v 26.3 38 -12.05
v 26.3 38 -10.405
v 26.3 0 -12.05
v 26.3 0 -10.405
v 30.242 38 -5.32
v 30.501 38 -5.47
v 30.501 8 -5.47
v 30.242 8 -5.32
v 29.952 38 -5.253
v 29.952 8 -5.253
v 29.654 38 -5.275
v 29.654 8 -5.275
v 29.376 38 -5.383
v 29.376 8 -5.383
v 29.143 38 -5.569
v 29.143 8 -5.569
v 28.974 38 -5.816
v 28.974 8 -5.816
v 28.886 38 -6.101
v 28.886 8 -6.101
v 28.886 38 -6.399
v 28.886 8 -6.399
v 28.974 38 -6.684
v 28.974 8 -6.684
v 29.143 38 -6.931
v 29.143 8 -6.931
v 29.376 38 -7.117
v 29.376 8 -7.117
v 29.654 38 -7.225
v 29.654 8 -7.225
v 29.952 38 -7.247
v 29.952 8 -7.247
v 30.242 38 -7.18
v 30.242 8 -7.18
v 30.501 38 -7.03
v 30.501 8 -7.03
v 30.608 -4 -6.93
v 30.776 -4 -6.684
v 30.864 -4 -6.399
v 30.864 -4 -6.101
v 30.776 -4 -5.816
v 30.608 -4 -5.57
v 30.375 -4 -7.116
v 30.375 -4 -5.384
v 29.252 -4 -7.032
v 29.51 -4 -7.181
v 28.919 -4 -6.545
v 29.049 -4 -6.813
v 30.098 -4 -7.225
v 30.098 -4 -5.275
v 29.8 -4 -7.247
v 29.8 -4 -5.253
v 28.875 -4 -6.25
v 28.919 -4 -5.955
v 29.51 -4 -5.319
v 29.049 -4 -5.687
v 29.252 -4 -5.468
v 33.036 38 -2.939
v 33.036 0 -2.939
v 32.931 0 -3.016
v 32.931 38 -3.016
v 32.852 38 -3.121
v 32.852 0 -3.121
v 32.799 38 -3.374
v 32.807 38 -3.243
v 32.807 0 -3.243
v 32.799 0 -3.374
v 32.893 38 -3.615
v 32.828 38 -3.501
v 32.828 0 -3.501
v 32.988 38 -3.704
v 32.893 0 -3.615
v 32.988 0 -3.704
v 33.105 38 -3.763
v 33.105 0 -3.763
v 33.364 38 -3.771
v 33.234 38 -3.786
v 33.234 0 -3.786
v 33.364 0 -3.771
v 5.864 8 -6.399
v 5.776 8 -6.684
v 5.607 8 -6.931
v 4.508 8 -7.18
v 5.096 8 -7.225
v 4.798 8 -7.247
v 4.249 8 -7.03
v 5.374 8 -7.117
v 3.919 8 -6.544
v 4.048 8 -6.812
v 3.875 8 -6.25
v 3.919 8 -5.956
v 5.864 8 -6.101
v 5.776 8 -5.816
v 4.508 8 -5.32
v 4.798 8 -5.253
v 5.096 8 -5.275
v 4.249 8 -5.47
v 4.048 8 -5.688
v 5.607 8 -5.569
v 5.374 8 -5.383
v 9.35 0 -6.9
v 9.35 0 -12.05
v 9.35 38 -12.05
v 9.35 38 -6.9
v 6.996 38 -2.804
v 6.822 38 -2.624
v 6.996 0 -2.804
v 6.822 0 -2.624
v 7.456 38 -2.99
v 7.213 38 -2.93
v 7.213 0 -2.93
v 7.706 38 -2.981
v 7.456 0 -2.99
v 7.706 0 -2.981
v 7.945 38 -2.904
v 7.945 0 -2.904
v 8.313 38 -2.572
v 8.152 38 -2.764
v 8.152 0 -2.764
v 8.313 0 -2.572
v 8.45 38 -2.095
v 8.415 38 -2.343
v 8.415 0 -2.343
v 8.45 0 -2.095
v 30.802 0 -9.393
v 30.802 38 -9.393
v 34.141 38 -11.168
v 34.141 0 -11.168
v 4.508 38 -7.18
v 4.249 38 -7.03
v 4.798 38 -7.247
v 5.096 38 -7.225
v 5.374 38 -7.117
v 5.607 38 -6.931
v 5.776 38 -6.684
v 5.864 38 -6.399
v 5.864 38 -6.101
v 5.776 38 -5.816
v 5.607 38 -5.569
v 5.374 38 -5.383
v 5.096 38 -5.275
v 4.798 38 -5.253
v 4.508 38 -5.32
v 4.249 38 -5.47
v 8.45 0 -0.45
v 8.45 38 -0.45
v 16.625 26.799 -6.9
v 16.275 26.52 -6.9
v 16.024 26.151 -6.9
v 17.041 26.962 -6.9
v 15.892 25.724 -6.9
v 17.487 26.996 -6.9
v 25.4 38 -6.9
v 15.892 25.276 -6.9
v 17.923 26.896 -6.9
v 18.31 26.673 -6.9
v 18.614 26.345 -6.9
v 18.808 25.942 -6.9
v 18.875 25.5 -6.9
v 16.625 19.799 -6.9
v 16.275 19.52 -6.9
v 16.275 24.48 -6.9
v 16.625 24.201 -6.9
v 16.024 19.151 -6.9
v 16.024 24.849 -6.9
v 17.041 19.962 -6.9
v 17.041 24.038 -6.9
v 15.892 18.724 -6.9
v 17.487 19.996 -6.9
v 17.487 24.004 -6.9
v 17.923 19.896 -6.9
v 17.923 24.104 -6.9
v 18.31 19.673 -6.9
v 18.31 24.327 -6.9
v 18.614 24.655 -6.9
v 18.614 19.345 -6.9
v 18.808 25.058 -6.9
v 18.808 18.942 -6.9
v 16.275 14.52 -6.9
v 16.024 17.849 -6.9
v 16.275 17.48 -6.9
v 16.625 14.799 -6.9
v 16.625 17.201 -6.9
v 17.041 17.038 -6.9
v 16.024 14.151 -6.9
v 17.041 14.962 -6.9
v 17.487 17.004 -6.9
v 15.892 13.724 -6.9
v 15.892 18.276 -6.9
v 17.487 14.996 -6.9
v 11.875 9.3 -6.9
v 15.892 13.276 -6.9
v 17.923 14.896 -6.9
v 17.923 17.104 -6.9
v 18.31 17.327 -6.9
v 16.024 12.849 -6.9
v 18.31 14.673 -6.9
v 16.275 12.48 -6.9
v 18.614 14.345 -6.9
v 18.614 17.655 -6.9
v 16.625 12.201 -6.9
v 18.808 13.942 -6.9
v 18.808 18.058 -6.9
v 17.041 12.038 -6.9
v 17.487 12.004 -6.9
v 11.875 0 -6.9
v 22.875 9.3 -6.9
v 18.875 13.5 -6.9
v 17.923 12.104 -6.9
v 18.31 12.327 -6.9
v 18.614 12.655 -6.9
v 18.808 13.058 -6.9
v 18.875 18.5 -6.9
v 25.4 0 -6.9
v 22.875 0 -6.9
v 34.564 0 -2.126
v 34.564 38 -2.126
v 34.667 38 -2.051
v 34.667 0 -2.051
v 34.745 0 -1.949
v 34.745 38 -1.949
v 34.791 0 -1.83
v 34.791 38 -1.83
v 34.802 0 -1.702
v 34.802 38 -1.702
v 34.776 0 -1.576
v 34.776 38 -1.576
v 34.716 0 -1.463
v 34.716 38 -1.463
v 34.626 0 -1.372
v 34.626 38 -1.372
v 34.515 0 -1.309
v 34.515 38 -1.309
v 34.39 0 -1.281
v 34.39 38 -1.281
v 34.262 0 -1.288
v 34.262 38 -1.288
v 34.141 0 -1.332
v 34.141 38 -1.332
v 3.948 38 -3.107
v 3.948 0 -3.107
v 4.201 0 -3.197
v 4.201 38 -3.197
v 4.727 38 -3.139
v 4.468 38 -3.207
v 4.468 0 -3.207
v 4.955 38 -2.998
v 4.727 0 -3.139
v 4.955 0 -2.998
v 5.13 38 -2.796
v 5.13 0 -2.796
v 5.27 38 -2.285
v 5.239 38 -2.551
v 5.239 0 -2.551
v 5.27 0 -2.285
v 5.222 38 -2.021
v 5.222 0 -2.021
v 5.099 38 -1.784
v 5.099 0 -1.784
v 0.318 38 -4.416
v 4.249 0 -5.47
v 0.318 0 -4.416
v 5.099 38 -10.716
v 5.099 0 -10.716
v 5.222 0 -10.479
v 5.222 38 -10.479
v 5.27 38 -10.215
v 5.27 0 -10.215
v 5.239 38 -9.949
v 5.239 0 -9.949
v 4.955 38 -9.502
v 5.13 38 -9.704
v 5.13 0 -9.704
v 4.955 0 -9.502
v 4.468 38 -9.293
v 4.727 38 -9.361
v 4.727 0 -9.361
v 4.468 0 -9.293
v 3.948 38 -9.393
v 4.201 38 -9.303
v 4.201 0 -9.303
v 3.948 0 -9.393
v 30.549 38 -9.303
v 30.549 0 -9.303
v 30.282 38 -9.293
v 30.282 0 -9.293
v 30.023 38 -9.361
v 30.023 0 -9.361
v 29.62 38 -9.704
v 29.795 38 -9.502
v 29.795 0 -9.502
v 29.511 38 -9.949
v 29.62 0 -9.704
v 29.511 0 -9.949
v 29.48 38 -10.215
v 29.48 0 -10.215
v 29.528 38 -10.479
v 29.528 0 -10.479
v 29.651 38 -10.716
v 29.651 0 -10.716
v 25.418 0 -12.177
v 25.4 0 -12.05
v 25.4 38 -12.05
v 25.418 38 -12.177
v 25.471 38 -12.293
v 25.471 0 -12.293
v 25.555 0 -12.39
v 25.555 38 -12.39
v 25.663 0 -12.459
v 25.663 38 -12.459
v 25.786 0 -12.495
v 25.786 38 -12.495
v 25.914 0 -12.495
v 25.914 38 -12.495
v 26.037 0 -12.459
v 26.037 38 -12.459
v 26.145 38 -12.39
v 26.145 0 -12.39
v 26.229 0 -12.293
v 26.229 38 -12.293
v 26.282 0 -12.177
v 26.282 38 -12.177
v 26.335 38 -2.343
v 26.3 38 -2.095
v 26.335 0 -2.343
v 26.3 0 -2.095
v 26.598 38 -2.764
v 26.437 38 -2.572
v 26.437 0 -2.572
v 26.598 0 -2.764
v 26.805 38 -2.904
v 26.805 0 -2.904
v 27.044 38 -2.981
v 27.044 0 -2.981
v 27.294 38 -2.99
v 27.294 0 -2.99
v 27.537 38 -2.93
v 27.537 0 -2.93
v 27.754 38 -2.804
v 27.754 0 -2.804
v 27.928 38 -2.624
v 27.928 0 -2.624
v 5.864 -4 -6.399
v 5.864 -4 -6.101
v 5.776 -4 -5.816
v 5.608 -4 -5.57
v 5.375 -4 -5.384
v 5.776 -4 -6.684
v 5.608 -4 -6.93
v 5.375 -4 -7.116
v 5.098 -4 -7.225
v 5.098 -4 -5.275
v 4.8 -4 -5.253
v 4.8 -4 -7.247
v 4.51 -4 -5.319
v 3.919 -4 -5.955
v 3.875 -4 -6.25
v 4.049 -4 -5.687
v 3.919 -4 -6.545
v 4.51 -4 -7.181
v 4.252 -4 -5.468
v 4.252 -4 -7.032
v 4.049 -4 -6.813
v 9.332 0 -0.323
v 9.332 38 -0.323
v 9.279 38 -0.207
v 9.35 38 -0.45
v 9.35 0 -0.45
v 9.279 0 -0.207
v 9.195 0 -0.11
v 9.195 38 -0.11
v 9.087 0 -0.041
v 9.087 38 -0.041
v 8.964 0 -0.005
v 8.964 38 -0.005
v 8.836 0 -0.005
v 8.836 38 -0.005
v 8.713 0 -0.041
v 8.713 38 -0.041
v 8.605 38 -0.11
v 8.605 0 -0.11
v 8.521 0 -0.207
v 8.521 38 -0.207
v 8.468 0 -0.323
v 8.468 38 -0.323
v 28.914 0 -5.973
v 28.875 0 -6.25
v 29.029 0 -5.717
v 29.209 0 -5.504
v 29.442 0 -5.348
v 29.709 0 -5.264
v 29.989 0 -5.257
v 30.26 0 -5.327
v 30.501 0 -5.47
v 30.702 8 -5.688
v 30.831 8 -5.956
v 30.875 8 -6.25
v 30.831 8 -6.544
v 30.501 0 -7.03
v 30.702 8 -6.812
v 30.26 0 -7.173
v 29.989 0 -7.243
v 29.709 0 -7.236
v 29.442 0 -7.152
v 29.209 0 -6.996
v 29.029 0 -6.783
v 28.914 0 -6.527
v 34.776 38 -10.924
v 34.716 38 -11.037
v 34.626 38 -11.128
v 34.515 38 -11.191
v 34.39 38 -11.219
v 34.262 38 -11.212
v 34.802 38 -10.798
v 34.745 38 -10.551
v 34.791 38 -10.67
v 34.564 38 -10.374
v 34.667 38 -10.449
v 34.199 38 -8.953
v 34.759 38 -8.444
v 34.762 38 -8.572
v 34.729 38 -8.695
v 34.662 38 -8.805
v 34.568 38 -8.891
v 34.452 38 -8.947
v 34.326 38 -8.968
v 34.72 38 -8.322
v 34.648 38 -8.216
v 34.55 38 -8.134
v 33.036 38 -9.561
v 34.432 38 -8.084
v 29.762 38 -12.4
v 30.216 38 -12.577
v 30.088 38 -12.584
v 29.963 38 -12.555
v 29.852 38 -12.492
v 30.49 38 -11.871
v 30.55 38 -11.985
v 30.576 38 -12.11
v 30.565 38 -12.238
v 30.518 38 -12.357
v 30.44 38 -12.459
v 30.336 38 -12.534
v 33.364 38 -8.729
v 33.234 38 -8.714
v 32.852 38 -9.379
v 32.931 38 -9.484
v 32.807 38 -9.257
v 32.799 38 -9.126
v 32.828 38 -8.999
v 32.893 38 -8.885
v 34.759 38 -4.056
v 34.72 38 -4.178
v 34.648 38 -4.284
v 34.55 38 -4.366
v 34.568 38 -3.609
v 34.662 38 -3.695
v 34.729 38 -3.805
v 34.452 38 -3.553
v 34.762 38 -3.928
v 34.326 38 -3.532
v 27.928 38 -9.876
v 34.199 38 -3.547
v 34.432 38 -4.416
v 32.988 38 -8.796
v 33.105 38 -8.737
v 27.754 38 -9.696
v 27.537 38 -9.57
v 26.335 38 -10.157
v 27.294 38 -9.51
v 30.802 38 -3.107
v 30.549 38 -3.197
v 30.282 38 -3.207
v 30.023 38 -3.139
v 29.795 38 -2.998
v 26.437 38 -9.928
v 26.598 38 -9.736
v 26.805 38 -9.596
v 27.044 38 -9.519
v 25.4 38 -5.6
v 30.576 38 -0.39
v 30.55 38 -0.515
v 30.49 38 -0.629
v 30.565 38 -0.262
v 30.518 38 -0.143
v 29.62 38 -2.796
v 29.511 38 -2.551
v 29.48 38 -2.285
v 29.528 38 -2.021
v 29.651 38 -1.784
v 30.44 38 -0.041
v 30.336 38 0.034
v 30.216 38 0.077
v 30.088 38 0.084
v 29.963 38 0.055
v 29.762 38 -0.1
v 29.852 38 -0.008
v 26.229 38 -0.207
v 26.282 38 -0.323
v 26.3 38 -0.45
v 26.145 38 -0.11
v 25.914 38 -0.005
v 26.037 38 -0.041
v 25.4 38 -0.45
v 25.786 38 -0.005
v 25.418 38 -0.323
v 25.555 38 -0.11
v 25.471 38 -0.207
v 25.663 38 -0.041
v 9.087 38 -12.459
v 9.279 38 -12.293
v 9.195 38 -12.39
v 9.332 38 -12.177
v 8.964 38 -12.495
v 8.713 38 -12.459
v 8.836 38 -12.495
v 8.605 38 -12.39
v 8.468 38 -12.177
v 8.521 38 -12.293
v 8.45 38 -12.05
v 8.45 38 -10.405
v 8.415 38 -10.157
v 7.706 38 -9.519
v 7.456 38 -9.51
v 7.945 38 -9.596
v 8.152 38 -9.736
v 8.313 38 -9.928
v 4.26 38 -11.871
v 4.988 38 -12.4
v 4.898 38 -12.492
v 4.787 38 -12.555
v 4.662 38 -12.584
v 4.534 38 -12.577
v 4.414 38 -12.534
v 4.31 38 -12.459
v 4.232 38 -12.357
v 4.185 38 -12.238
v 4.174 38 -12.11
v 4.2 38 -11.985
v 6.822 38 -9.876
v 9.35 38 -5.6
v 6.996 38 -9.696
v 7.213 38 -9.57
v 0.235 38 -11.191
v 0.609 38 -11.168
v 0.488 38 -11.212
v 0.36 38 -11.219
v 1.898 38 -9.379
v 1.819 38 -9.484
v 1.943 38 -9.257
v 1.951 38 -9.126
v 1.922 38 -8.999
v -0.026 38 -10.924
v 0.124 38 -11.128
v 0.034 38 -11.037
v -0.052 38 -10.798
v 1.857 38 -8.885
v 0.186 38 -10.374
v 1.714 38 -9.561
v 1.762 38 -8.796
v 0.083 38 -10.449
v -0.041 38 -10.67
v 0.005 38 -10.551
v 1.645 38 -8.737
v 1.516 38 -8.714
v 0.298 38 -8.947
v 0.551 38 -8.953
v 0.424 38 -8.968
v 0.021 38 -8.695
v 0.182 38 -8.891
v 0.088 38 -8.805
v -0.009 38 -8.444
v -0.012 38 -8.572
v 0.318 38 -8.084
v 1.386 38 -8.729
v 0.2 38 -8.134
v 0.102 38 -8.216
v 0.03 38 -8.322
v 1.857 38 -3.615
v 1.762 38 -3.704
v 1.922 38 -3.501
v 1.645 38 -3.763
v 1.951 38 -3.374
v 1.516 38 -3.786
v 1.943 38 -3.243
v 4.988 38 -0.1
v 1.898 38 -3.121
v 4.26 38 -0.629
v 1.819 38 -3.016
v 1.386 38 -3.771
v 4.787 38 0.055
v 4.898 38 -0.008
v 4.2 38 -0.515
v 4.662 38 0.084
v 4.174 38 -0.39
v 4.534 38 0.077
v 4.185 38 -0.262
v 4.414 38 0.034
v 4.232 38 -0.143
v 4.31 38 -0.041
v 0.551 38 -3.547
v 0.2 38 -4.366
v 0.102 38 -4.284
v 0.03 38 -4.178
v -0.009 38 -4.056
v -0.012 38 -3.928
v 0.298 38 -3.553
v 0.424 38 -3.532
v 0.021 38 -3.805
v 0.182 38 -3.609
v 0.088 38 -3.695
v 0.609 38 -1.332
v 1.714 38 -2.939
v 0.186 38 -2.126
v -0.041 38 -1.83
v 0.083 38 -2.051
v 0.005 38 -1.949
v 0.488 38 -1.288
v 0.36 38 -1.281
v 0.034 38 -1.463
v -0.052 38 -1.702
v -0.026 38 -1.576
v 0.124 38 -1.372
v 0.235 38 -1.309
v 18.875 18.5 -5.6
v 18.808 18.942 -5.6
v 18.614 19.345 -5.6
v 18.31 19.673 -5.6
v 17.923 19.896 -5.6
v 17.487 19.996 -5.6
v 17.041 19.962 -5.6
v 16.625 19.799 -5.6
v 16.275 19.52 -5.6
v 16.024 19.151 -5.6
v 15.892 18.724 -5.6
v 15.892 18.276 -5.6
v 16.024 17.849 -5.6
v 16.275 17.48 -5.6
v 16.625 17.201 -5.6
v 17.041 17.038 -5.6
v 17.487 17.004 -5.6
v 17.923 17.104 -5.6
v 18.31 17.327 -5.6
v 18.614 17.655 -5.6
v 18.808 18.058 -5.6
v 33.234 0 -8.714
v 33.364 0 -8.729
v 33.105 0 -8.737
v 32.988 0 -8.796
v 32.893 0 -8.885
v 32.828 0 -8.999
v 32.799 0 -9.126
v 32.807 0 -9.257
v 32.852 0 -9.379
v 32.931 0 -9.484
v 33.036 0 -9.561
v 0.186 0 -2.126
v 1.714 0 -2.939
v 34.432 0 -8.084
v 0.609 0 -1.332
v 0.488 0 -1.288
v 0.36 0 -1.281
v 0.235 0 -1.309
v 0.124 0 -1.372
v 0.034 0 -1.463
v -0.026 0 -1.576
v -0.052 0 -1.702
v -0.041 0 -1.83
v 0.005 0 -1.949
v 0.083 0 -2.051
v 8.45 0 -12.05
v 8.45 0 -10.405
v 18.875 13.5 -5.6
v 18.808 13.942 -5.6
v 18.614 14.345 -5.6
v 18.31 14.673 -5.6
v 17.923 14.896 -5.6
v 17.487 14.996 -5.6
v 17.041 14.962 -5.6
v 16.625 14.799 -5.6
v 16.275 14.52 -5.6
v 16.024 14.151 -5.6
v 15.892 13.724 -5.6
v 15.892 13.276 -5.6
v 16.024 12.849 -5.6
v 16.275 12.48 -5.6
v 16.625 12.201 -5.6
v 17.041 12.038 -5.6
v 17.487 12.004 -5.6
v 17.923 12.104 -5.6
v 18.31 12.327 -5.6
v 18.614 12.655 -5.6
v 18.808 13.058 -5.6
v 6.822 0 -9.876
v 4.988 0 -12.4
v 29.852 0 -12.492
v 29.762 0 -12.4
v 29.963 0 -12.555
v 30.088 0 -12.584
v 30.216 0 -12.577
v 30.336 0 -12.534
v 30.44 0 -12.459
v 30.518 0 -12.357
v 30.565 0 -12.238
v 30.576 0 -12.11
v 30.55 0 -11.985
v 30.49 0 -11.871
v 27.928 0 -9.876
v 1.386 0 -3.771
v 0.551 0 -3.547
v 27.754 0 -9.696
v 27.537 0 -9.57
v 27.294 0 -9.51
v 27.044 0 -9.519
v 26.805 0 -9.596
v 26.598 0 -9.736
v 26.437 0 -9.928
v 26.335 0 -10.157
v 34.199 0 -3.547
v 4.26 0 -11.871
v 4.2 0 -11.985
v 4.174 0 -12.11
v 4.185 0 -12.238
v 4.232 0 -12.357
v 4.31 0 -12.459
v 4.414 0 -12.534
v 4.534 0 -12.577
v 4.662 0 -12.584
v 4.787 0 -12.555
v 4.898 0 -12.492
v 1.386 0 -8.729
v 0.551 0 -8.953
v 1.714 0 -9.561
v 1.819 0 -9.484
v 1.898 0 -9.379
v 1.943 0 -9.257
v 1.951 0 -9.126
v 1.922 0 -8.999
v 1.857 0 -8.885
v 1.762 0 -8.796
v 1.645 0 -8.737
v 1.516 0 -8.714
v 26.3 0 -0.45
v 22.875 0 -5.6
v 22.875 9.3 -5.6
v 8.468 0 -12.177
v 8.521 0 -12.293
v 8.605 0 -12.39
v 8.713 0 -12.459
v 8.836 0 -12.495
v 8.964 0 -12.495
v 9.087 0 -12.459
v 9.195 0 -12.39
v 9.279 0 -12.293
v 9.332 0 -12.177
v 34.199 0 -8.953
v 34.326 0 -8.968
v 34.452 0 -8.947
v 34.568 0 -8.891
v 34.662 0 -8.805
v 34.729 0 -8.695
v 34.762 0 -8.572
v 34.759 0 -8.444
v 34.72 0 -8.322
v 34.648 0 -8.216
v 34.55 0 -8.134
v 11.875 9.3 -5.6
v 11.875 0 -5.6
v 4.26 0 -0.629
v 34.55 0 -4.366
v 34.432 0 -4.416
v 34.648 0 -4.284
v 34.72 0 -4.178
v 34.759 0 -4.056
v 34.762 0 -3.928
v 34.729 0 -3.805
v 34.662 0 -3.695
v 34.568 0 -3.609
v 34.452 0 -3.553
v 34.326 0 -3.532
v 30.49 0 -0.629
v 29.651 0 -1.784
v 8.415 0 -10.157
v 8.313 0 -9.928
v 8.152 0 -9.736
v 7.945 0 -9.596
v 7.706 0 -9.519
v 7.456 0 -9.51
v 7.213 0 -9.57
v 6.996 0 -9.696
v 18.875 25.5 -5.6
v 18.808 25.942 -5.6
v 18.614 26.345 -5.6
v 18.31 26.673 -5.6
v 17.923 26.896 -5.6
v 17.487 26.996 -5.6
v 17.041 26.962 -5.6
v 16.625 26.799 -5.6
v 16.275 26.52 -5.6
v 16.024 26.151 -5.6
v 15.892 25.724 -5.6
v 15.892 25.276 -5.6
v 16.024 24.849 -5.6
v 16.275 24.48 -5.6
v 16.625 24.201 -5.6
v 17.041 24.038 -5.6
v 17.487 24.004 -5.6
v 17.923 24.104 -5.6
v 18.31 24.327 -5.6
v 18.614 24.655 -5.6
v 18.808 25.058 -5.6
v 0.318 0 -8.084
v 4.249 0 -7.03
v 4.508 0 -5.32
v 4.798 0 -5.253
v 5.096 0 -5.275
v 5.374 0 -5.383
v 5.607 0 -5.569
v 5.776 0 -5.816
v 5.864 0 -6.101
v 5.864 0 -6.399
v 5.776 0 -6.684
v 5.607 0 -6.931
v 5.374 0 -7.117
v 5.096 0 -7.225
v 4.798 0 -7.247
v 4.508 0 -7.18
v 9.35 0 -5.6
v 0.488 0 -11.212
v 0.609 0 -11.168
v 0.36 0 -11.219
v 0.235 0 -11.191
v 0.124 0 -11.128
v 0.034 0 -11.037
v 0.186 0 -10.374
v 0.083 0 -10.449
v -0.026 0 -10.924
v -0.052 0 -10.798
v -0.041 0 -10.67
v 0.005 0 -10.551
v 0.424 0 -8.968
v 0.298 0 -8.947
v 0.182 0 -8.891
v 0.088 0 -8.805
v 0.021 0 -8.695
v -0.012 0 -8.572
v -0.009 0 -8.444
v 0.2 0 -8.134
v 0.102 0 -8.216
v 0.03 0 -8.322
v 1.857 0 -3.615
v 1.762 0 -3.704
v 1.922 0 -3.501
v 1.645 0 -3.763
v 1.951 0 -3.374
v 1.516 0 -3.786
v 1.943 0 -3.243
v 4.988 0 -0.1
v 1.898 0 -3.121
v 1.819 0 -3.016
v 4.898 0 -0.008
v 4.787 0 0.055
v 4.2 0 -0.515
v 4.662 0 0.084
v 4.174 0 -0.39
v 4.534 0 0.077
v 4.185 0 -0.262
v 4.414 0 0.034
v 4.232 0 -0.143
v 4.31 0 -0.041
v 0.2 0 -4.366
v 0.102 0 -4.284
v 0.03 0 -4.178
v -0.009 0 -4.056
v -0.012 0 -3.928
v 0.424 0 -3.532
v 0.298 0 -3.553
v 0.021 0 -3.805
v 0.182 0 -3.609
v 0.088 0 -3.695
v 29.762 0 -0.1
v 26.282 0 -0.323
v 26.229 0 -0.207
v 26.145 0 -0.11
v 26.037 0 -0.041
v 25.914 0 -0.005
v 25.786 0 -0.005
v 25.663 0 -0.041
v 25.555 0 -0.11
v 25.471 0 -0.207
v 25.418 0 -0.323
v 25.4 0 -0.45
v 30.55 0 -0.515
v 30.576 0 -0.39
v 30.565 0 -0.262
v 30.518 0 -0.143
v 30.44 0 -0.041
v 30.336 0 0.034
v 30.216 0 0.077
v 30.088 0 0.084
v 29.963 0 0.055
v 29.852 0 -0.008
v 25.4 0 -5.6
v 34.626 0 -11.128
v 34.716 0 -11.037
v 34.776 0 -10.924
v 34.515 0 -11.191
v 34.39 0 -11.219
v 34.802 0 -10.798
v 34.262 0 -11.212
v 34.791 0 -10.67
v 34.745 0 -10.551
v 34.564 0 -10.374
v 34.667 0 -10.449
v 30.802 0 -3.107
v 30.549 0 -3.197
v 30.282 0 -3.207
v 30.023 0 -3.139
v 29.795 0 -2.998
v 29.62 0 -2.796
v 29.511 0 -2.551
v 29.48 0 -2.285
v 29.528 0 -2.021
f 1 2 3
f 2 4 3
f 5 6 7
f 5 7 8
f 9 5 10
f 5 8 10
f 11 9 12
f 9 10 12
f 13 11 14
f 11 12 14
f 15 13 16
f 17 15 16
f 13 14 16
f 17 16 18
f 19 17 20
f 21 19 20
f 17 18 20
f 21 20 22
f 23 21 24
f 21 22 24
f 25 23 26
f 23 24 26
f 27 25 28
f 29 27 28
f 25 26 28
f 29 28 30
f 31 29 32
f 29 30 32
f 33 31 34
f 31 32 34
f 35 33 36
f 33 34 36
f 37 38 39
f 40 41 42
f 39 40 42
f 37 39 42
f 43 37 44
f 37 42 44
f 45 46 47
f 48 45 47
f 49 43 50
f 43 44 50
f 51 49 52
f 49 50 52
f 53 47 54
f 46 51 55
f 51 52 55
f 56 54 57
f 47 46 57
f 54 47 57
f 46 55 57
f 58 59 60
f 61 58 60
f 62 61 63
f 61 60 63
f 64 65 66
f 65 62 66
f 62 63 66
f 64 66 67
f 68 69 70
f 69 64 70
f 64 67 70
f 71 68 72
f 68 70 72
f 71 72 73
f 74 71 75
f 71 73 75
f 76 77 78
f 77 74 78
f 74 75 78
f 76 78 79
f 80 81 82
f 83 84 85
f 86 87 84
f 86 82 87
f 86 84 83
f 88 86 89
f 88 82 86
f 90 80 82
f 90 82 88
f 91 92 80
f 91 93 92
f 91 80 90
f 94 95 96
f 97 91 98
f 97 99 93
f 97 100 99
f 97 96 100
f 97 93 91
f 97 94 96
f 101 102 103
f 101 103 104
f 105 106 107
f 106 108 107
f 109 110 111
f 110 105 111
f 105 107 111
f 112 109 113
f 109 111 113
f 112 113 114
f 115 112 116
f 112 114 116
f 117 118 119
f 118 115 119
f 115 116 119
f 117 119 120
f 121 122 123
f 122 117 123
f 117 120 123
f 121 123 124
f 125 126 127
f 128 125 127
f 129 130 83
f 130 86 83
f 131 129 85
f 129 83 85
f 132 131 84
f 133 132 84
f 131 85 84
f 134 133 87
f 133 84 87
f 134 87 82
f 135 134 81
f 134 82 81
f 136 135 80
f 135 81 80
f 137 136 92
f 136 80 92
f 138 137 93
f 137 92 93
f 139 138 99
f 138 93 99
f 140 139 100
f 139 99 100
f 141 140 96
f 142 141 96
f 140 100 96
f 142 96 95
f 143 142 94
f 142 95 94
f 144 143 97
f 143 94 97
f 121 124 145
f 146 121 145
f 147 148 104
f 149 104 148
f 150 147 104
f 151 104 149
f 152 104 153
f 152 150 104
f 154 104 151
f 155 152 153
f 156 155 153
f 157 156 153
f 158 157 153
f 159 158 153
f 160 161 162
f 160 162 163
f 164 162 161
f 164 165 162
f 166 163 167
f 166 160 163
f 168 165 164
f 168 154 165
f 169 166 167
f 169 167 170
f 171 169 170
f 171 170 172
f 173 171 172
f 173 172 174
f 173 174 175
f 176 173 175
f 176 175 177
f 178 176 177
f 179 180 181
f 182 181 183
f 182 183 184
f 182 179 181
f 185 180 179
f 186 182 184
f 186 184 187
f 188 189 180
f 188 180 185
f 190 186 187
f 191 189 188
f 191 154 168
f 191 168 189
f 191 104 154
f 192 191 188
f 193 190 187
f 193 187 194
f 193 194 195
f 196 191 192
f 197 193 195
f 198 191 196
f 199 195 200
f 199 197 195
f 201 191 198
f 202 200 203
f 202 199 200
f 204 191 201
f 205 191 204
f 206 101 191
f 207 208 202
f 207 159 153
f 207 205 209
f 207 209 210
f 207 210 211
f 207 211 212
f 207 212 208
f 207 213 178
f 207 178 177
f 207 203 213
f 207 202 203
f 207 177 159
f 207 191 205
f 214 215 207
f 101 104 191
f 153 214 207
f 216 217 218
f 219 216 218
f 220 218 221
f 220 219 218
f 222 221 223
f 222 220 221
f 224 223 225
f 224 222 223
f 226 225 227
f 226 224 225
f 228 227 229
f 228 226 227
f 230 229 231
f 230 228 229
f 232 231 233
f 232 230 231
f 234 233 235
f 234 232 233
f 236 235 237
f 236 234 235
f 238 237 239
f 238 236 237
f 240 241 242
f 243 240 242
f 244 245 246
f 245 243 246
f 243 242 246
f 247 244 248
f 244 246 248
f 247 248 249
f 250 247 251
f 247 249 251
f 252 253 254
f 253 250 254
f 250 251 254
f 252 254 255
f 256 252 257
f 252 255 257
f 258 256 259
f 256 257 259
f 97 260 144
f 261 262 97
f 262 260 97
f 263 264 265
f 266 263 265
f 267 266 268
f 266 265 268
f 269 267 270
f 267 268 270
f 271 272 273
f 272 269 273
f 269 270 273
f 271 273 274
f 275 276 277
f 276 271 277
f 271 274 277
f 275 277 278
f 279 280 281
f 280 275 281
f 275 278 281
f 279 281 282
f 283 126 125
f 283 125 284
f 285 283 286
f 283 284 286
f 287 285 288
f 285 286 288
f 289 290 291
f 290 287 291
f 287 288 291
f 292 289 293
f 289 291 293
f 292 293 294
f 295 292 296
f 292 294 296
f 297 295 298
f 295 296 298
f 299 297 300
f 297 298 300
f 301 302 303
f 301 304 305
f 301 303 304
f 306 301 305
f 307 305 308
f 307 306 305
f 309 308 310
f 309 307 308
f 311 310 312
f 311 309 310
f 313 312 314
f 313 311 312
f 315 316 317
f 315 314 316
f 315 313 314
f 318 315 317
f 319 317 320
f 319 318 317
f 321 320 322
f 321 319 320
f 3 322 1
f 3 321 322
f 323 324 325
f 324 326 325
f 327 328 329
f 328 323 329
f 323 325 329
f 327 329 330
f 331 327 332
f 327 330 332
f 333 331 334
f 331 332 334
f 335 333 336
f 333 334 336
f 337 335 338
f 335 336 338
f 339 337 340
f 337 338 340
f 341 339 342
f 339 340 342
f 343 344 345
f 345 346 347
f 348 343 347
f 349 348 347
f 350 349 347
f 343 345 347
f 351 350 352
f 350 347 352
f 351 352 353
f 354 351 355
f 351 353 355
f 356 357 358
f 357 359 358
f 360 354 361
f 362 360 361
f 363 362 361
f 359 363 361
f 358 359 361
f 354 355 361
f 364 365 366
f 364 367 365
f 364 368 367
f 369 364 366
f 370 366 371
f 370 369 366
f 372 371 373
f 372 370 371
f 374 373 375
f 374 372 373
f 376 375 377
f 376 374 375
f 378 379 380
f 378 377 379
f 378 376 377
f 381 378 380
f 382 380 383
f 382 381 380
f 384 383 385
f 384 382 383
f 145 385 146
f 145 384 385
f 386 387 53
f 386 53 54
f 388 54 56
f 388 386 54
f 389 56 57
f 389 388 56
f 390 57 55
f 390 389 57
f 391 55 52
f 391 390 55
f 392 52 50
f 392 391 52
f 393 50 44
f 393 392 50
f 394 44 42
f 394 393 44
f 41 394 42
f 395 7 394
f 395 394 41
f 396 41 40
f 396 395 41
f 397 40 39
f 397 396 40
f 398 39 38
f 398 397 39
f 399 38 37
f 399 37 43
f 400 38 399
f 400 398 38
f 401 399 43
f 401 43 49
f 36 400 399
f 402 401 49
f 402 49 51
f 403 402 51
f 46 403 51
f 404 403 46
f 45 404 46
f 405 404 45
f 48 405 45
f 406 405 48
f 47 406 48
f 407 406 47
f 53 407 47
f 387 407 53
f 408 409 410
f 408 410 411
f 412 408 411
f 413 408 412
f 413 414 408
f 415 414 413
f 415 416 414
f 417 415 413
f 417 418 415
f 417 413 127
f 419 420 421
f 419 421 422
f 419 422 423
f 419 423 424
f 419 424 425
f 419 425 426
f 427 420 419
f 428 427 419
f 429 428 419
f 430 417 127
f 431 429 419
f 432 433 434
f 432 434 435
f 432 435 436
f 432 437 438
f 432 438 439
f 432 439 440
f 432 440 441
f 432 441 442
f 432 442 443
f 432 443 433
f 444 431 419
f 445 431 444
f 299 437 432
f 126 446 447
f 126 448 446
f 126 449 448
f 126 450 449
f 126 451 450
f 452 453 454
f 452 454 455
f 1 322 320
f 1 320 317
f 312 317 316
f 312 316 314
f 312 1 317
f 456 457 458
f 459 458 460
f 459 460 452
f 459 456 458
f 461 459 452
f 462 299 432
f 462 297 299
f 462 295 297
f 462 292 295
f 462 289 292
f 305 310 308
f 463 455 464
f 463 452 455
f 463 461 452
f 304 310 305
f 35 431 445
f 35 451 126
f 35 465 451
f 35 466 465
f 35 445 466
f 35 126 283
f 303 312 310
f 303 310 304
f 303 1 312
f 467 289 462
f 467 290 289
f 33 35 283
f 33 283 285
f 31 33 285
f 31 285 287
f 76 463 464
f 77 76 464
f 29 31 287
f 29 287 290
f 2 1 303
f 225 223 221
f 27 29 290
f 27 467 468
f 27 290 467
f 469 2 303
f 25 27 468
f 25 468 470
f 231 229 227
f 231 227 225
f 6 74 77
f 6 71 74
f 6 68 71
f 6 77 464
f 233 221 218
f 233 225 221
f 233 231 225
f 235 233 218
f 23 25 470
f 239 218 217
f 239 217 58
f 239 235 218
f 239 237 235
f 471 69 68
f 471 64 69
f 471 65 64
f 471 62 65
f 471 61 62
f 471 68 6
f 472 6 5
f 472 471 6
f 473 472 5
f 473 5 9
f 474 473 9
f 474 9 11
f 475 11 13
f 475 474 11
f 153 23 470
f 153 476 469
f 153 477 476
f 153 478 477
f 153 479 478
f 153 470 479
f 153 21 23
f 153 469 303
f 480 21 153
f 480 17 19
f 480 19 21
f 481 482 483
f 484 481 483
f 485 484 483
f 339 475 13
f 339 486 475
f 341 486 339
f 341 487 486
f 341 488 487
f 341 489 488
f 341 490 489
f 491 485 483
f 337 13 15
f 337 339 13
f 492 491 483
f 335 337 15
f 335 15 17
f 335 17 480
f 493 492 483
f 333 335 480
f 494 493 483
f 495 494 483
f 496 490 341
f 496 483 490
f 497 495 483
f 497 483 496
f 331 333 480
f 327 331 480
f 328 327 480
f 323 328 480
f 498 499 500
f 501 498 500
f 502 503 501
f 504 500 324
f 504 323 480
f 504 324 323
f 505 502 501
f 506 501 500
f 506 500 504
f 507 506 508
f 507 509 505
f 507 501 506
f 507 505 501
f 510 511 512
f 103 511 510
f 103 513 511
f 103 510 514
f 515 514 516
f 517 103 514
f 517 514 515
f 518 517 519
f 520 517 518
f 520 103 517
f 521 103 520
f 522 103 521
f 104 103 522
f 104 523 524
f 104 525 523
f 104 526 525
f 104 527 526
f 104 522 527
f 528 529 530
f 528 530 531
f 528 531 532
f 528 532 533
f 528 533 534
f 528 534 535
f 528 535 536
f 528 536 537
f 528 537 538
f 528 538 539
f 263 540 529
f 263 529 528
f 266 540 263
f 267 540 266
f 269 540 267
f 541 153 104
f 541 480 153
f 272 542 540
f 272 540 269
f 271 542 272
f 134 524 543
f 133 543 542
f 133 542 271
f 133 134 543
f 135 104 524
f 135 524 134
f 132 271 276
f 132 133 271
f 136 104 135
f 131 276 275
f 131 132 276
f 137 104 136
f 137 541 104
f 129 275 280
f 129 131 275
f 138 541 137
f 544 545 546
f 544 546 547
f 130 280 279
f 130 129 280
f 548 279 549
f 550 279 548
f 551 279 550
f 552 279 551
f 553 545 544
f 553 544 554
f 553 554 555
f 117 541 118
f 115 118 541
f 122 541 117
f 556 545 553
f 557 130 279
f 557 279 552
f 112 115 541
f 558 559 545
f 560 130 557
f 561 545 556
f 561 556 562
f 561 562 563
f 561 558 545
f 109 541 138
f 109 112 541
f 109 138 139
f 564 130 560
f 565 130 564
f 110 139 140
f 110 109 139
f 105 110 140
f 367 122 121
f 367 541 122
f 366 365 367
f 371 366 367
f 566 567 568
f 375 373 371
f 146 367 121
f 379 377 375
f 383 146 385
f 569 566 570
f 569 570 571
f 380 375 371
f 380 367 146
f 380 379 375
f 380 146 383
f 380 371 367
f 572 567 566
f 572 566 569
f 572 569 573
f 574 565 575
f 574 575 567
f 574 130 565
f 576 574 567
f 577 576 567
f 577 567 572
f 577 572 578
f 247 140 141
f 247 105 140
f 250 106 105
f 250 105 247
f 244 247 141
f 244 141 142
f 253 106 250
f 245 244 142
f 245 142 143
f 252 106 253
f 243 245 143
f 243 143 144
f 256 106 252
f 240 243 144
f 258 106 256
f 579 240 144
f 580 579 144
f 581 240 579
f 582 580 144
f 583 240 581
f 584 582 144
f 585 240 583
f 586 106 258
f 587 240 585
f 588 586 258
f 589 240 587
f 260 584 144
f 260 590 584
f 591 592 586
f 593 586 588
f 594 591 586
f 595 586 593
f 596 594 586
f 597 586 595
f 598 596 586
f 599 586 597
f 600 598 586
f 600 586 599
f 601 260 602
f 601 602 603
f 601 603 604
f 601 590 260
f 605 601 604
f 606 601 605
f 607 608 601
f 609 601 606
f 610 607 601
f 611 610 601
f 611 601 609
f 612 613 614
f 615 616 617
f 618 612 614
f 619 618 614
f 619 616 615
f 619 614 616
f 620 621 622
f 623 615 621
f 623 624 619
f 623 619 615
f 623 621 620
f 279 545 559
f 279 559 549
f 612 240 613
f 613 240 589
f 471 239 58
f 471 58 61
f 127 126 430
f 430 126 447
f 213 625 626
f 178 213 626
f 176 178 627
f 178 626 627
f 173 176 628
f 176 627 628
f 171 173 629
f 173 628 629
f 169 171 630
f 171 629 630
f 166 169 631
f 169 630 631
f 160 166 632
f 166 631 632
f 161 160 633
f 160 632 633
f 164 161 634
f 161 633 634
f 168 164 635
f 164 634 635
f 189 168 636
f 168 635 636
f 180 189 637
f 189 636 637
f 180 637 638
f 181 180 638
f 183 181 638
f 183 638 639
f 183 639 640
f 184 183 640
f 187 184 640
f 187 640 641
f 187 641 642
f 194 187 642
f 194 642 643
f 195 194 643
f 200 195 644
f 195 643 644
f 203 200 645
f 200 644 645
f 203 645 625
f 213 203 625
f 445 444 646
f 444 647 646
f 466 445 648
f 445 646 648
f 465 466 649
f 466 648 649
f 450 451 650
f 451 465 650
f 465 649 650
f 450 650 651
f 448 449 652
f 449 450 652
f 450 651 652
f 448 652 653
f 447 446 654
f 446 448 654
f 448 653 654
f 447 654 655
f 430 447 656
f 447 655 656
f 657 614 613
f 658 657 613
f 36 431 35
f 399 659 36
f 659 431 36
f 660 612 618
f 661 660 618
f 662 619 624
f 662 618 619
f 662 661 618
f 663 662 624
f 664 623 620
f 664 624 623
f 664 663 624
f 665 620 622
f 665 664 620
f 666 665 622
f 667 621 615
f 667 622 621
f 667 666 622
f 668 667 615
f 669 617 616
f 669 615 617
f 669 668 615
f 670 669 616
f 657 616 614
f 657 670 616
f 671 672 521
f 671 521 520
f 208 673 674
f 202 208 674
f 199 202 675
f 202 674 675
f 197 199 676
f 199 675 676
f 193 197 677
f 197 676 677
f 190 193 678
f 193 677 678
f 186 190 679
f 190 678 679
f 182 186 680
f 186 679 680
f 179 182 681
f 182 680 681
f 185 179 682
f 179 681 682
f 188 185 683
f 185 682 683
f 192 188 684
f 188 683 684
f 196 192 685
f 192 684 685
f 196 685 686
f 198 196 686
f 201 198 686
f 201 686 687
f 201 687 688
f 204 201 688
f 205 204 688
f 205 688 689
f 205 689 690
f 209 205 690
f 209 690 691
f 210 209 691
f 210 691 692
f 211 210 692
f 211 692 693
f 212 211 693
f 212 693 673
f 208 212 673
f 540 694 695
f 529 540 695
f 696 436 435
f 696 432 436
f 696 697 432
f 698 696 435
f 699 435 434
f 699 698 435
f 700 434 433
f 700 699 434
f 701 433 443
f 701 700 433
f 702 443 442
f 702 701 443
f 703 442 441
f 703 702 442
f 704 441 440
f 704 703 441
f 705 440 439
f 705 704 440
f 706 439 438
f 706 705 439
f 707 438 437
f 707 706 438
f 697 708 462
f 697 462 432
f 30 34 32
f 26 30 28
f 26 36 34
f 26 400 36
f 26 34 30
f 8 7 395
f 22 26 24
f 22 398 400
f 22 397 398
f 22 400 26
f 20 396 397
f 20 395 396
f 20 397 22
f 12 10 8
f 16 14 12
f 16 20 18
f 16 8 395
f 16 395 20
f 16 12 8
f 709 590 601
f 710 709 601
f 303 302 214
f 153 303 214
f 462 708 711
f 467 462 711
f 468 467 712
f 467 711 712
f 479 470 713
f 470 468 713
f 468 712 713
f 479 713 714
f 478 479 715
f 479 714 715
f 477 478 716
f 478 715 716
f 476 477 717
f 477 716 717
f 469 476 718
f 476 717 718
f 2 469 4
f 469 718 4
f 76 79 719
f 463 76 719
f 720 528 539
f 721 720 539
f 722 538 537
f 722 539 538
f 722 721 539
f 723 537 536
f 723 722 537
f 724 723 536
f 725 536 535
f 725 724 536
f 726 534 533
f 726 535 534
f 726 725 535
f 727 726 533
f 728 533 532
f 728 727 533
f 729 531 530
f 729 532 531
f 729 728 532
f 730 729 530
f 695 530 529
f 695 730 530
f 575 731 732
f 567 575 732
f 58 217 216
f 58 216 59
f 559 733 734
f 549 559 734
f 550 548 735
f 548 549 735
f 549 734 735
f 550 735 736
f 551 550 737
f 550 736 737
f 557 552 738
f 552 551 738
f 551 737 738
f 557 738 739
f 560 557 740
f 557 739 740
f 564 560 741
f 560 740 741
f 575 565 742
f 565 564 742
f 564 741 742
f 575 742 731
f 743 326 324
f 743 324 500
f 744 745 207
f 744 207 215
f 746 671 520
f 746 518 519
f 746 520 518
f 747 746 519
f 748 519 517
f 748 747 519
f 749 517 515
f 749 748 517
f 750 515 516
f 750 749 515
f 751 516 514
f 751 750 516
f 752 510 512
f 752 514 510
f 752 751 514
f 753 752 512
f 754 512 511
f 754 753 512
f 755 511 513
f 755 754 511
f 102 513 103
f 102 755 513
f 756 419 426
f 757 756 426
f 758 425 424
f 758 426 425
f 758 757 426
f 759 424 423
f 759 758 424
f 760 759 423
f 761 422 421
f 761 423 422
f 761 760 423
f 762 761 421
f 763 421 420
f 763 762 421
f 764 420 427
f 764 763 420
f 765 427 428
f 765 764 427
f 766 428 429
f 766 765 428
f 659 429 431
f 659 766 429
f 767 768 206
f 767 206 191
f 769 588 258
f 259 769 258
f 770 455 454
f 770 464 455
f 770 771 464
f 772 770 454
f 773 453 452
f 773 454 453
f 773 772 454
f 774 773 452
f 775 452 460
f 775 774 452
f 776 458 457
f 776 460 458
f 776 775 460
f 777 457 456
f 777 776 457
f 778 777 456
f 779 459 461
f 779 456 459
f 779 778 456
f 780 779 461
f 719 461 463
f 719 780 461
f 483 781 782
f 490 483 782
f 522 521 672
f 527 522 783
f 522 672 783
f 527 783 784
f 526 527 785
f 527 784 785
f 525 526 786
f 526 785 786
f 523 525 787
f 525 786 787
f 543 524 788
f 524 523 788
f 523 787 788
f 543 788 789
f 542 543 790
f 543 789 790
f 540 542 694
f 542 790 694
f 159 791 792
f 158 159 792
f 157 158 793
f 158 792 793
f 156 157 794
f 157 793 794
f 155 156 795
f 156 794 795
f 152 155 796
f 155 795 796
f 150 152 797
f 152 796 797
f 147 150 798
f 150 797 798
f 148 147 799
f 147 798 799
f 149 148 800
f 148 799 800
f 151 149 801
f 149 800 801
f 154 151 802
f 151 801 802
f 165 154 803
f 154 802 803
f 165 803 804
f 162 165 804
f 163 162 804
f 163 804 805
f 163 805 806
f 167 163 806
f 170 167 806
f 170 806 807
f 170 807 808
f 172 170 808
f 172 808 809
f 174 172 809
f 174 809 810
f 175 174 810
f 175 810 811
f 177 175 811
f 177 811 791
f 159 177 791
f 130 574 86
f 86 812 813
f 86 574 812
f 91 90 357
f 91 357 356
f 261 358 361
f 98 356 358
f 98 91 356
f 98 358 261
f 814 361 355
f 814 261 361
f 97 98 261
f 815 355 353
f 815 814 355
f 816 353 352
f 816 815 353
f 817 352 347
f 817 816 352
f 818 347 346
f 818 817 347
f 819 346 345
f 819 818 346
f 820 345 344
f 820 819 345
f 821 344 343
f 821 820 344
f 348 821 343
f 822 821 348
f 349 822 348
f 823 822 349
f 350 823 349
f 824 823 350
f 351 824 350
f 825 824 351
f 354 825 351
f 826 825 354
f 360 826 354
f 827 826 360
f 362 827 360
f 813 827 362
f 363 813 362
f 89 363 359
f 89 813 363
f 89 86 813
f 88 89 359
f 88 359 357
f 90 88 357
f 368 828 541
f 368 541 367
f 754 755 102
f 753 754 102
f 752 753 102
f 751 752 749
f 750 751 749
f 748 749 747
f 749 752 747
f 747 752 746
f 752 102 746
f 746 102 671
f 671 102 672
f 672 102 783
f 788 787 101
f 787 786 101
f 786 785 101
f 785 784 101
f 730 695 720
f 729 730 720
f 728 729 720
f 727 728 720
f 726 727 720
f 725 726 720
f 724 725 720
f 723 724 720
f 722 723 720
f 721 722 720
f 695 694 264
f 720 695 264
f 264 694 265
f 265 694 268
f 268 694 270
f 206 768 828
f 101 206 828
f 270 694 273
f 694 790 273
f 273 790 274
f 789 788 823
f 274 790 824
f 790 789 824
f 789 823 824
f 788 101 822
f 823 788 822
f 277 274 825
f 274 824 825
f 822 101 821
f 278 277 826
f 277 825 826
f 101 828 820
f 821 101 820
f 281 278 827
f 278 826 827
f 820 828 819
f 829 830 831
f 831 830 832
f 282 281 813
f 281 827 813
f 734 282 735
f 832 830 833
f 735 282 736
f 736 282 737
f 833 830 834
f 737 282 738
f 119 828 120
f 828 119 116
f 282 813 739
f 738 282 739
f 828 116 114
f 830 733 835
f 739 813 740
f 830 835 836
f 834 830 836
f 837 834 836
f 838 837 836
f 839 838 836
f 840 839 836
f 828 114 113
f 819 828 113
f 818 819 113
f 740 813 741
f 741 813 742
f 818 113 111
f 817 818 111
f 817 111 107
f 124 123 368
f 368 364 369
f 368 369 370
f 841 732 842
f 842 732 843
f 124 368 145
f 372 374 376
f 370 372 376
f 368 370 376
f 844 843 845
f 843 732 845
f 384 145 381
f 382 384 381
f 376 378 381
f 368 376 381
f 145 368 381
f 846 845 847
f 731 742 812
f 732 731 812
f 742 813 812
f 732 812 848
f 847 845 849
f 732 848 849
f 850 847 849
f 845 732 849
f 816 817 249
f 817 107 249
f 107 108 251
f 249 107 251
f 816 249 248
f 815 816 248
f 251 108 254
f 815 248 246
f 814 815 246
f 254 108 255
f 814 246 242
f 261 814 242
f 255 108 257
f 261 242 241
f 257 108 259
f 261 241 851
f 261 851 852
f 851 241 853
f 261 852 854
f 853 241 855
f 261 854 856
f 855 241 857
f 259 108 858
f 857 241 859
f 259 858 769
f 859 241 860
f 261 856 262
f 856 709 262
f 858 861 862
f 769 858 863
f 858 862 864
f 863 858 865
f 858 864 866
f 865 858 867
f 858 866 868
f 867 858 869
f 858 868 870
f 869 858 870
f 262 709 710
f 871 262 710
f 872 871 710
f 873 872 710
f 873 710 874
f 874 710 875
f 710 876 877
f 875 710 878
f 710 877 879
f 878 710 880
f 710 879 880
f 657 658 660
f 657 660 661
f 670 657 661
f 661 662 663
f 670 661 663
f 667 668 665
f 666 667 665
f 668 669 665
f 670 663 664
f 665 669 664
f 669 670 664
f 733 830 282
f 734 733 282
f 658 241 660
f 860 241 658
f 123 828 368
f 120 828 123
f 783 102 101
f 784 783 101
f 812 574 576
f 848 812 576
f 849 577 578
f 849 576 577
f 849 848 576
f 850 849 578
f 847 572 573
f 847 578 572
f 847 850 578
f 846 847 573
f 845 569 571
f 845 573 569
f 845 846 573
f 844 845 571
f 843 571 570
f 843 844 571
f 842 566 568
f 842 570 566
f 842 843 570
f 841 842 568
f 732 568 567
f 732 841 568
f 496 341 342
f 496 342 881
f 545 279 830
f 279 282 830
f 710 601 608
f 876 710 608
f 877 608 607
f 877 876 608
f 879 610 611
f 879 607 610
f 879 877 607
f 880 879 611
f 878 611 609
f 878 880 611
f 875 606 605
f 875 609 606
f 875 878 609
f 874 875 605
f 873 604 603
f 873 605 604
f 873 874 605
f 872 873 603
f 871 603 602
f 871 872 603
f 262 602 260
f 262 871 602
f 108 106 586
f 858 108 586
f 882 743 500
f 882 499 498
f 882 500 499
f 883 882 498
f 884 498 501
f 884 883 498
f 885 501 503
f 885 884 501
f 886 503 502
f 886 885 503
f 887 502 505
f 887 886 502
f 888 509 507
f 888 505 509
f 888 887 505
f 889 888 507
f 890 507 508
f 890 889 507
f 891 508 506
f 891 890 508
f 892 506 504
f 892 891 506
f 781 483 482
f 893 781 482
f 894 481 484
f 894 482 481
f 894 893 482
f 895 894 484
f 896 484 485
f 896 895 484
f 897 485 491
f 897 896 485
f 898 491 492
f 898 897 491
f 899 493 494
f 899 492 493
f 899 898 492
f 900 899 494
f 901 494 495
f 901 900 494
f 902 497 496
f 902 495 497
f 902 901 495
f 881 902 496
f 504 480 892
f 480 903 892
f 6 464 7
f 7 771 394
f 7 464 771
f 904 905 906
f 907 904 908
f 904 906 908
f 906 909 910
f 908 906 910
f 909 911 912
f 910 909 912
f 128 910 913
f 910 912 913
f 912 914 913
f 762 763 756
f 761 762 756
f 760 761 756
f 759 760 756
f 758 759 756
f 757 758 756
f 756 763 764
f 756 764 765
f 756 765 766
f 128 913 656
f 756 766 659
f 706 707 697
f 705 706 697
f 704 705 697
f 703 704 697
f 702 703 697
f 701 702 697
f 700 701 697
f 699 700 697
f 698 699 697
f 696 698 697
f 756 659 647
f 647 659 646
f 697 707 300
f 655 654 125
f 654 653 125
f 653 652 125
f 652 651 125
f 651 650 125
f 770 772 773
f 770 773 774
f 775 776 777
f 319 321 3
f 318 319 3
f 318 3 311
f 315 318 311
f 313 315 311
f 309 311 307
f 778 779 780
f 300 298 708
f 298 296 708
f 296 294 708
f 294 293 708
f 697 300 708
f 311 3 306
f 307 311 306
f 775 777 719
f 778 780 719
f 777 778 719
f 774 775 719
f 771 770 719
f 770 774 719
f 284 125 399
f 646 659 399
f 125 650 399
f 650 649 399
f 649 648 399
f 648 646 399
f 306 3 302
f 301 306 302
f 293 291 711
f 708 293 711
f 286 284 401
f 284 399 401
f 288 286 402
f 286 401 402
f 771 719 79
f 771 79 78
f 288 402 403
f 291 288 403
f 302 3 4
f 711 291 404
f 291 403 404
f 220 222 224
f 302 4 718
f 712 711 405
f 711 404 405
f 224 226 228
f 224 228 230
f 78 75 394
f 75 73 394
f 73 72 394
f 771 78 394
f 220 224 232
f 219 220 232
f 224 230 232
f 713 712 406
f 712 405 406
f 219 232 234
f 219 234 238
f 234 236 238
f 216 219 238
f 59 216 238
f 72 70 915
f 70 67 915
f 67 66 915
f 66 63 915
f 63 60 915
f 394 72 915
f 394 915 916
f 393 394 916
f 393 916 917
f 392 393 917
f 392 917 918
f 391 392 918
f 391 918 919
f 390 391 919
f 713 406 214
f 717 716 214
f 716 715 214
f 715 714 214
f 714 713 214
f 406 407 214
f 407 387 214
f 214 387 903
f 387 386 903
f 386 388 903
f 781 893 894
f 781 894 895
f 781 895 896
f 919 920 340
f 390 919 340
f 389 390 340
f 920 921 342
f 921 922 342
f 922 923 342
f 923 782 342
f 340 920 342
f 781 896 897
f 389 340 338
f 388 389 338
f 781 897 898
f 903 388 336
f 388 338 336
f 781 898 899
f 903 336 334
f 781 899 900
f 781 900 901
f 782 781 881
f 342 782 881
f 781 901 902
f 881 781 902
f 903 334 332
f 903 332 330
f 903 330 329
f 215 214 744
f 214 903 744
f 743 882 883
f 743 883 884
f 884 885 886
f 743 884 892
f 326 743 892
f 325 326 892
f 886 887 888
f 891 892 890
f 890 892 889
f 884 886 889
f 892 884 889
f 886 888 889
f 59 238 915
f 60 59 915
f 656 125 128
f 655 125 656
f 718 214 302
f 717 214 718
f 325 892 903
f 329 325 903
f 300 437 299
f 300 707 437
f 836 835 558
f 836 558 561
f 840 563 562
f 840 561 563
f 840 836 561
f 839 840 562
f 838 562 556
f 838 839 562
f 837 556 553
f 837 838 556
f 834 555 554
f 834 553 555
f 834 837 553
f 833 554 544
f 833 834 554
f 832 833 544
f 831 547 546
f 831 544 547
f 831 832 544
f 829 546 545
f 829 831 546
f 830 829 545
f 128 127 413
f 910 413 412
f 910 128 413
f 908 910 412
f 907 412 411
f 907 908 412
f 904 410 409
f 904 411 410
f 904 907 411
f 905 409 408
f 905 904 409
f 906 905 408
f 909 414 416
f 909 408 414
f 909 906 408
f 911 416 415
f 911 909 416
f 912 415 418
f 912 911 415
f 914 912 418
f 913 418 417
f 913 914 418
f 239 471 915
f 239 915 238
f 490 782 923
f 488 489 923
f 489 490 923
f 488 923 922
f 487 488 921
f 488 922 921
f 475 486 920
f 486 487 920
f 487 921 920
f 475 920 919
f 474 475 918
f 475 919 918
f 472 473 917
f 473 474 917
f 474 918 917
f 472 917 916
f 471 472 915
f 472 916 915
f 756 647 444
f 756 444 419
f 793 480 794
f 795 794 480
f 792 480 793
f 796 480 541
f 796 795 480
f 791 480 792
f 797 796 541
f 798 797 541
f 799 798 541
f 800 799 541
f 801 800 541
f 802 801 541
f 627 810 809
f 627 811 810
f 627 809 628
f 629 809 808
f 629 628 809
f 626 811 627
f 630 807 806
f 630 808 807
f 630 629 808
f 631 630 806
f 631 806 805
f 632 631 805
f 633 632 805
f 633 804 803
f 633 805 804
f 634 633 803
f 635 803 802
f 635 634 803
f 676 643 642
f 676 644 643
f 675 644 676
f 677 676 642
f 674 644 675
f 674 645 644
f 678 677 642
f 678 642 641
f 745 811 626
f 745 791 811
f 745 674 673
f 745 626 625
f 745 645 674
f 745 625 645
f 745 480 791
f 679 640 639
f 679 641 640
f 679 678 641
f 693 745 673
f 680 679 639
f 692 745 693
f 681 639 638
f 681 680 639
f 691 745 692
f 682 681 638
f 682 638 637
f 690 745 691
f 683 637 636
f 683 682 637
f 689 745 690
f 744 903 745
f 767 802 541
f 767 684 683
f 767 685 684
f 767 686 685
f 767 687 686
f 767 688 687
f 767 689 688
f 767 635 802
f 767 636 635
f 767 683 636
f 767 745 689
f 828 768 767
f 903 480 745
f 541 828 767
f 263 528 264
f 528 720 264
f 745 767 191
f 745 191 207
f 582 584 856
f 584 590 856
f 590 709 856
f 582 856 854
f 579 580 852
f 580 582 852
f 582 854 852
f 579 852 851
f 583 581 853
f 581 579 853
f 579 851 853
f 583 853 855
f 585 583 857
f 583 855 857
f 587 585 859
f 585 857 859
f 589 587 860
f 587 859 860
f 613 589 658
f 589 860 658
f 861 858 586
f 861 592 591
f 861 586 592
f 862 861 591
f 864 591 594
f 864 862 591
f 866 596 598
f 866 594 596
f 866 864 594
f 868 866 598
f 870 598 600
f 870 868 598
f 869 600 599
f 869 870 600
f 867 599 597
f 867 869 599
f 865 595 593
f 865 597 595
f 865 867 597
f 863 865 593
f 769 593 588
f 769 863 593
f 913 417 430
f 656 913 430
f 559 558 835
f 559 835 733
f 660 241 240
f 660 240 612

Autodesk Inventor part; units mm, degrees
ref_plane "YZ Plane" through (0, 0, 0) normal (1, 0, 0) x (0, 1, 0)
ref_plane "XZ Plane" through (0, 0, 0) normal (0, 1, 0) x (-1, 0, 0)
ref_plane "XY Plane" through (0, 0, 0) normal (0, 0, 1) x (1, 0, 0)
sketch "Sketch1" plane through (0, 0, 0) normal (0, 1, 0) x (-1, 0, 0)
  line L0 (-9.35, 0) -> (-9.35, -12.5) construction
  line L1 (-25.4, 0) -> (-25.4, -12.5) construction
  line L2 (-9.35, -6.9) -> (-25.4, -6.9)
  line L3 (-25.4, -6.9) -> (-25.4, -5.6)
  line L4 (-25.4, -5.6) -> (-9.35, -5.6)
  line L5 (-9.35, -5.6) -> (-9.35, -6.9)
  circle A0 centre (-4.875, -6.25) radius 1
  circle A1 centre (-29.875, -6.25) radius 1
  line L6 (-9.35, 0) -> (-8.9, 0) construction
  line L7 (-25.4, 0) -> (-25.85, 0) construction
  line L8 (-8.45, -10.4049) -> (-8.45, -12.05)
  line L9 (-9.35, -12.05) -> (-9.35, -0.45)
  arc A2 (-8.45, -0.45) -> (-9.35, -0.45) centre (-8.9, -0.45) ccw
  arc A3 (-9.35, -12.05) -> (-8.45, -12.05) centre (-8.9, -12.05) ccw
  line L10 (-25.4, -12.05) -> (-25.4, -0.45)
  arc A4 (-25.4, -0.45) -> (-26.3, -0.45) centre (-25.85, -0.45) ccw
  arc A5 (-26.3, -12.05) -> (-25.4, -12.05) centre (-25.85, -12.05) ccw
  line L11 (-6.8219, -9.8759) -> (-4.9877, -12.4004)
  line L12 (-4.2596, -11.8714) -> (-5.0989, -10.7162)
  arc A6 (-4.9877, -12.4004) -> (-4.2596, -11.8714) centre (-4.6236, -12.1359) ccw
  line L13 (-3.9482, -9.3926) -> (-0.6086, -11.1683)
  line L14 (-0.1861, -10.3736) -> (-1.7142, -9.5611)
  arc A7 (-0.6086, -11.1683) -> (-0.1861, -10.3736) centre (-0.3973, -10.771) ccw
  line L15 (-1.3864, -8.7291) -> (-0.5511, -8.9529)
  line L16 (-0.3182, -8.0836) -> (-8.3489, -5.9318)
  arc A8 (-0.5511, -8.9529) -> (-0.3182, -8.0836) centre (-0.4347, -8.5183) ccw
  arc A9 (-6.8219, -9.8759) -> (-8.45, -10.4049) centre (-7.55, -10.4049) ccw
  arc A10 (-3.9482, -9.3926) -> (-5.0989, -10.7162) centre (-4.3708, -10.1872) ccw
  arc A11 (-1.3864, -8.7291) -> (-1.7142, -9.5611) centre (-1.5029, -9.1638) ccw
  line L17 (-8.45, -2.0951) -> (-8.45, -0.45)
  line L18 (-6.8219, -2.6241) -> (-4.9877, -0.0996)
  line L19 (-4.2596, -0.6286) -> (-5.0989, -1.7838)
  arc A12 (-4.2596, -0.6286) -> (-4.9877, -0.0996) centre (-4.6236, -0.3641) ccw
  line L20 (-3.9482, -3.1074) -> (-0.6086, -1.3317)
  line L21 (-0.1861, -2.1264) -> (-1.7142, -2.9389)
  arc A13 (-0.1861, -2.1264) -> (-0.6086, -1.3317) centre (-0.3973, -1.729) ccw
  line L22 (-1.3864, -3.7709) -> (-0.5511, -3.5471)
  line L23 (-0.3182, -4.4164) -> (-8.3489, -6.5682)
  arc A14 (-0.3182, -4.4164) -> (-0.5511, -3.5471) centre (-0.4347, -3.9817) ccw
  arc A15 (-8.45, -2.0951) -> (-6.8219, -2.6241) centre (-7.55, -2.0951) ccw
  arc A16 (-5.0989, -1.7838) -> (-3.9482, -3.1074) centre (-4.3708, -2.3128) ccw
  arc A17 (-1.7142, -2.9389) -> (-1.3864, -3.7709) centre (-1.5029, -3.3362) ccw
  line L24 (-26.3, -10.4049) -> (-26.3, -12.05)
  arc A18 (-26.3, -12.05) -> (-25.4, -12.05) centre (-25.85, -12.05) ccw
  line L25 (-27.9281, -9.8759) -> (-29.7623, -12.4004)
  line L26 (-30.4904, -11.8714) -> (-29.6511, -10.7162)
  arc A19 (-30.4904, -11.8714) -> (-29.7623, -12.4004) centre (-30.1264, -12.1359) ccw
  line L27 (-30.8018, -9.3926) -> (-34.1414, -11.1683)
  line L28 (-34.5639, -10.3736) -> (-33.0358, -9.5611)
  arc A20 (-34.5639, -10.3736) -> (-34.1414, -11.1683) centre (-34.3527, -10.771) ccw
  line L29 (-33.3636, -8.7291) -> (-34.1989, -8.9529)
  line L30 (-34.4318, -8.0836) -> (-26.4011, -5.9318)
  arc A21 (-34.4318, -8.0836) -> (-34.1989, -8.9529) centre (-34.3153, -8.5183) ccw
  arc A22 (-26.3, -10.4049) -> (-27.9281, -9.8759) centre (-27.2, -10.4049) ccw
  arc A23 (-29.6511, -10.7162) -> (-30.8018, -9.3926) centre (-30.3792, -10.1872) ccw
  arc A24 (-33.0358, -9.5611) -> (-33.3636, -8.7291) centre (-33.2471, -9.1638) ccw
  line L31 (-26.3, -2.0951) -> (-26.3, -0.45)
  arc A25 (-27.9281, -2.6241) -> (-26.3, -2.0951) centre (-27.2, -2.0951) ccw
  line L32 (-27.9281, -2.6241) -> (-29.7623, -0.0996)
  arc A26 (-29.7623, -0.0996) -> (-30.4904, -0.6286) centre (-30.1264, -0.3641) ccw
  line L33 (-30.4904, -0.6286) -> (-29.6511, -1.7838)
  arc A27 (-30.8018, -3.1074) -> (-29.6511, -1.7838) centre (-30.3792, -2.3128) ccw
  line L34 (-30.8018, -3.1074) -> (-34.1414, -1.3317)
  arc A28 (-34.1414, -1.3317) -> (-34.5639, -2.1264) centre (-34.3527, -1.729) ccw
  line L35 (-34.5639, -2.1264) -> (-33.0358, -2.9389)
  arc A29 (-33.3636, -3.7709) -> (-33.0358, -2.9389) centre (-33.2471, -3.3362) ccw
  line L36 (-33.3636, -3.7709) -> (-34.1989, -3.5471)
  arc A30 (-34.1989, -3.5471) -> (-34.4318, -4.4164) centre (-34.3153, -3.9817) ccw
  line L37 (-34.4318, -4.4164) -> (-26.4011, -6.5682)
  point P0 (0, 0)
  point P1 (-25.85, -6.25)
  point P2 (-6.6296, -9.375)
  point P3 (-4.45, -8.6161)
  point P4 (-4.45, -7.4424)
  point P5 (-30.5005, -5.4698)
  point P6 (-30.5005, -7.0302)
  point P7 (-4.2495, -7.0302)
  point P8 (-4.2495, -5.4698)
extrude "Extrusion1" add sketch "Sketch1" along normal blind 38 contours L2 L3 L4 L5 | L5 L9 A2 L17 A15 L18 A12 L19 A16 L20 A13 L21 A17 L22 A14 L23 A0 L16 A8 L15 A11 L14 A7 L13 A10 L12 A6 L11 A9 L8 A3 | L10 A5 L24 A22 L25 A19 L26 A23 L27 A20 L28 A24 L29 A21 L30 A1 L37 A30 L36 A29 L35 A28 L34 A27 L33 A26 L32 A25 L31 A4 L3 | L16 L23 A0 | A1 L37 L30 picked at (-6.2987, -6.25) picked at (-28.4488, -6.2912)
extrude "Extrusion2" add sketch "Sketch1" along normal blind 8 and the other way blind 4 contours L16 A0 L23 | A0 L16 | L30 A1 | A1 L37 L30 | L23 A0 | A1 L37 picked at (-4.6521, -6.705) picked at (-30.1259, -6.0659)
sketch "Sketch2" plane through (9.35, 0, -5.6) normal (0, 0, 1) x (1, 0, 0)
  line L0 (0, 0) -> (16.05, 0) construction
  line L1 (8.025, 0) -> (13.525, 0) construction
  line L2 (13.525, 0) -> (2.525, 0)
  line L3 (2.525, 0) -> (2.525, 9.3)
  line L4 (2.525, 9.3) -> (13.525, 9.3)
  line L5 (13.525, 9.3) -> (13.525, 0)
  line L6 (0, 38) -> (16.05, 38) construction
  circle A0 centre (8.025, 25.5) radius 1.5
  circle A1 centre (8.025, 18.5) radius 1.5
  circle A2 centre (8.025, 13.5) radius 1.5
  point P0 (-9.35, 0)
extrude "Extrusion3" cut sketch "Sketch2" against normal through all
properties part number "Steren Heatsink" material "Aluminum 6061"
